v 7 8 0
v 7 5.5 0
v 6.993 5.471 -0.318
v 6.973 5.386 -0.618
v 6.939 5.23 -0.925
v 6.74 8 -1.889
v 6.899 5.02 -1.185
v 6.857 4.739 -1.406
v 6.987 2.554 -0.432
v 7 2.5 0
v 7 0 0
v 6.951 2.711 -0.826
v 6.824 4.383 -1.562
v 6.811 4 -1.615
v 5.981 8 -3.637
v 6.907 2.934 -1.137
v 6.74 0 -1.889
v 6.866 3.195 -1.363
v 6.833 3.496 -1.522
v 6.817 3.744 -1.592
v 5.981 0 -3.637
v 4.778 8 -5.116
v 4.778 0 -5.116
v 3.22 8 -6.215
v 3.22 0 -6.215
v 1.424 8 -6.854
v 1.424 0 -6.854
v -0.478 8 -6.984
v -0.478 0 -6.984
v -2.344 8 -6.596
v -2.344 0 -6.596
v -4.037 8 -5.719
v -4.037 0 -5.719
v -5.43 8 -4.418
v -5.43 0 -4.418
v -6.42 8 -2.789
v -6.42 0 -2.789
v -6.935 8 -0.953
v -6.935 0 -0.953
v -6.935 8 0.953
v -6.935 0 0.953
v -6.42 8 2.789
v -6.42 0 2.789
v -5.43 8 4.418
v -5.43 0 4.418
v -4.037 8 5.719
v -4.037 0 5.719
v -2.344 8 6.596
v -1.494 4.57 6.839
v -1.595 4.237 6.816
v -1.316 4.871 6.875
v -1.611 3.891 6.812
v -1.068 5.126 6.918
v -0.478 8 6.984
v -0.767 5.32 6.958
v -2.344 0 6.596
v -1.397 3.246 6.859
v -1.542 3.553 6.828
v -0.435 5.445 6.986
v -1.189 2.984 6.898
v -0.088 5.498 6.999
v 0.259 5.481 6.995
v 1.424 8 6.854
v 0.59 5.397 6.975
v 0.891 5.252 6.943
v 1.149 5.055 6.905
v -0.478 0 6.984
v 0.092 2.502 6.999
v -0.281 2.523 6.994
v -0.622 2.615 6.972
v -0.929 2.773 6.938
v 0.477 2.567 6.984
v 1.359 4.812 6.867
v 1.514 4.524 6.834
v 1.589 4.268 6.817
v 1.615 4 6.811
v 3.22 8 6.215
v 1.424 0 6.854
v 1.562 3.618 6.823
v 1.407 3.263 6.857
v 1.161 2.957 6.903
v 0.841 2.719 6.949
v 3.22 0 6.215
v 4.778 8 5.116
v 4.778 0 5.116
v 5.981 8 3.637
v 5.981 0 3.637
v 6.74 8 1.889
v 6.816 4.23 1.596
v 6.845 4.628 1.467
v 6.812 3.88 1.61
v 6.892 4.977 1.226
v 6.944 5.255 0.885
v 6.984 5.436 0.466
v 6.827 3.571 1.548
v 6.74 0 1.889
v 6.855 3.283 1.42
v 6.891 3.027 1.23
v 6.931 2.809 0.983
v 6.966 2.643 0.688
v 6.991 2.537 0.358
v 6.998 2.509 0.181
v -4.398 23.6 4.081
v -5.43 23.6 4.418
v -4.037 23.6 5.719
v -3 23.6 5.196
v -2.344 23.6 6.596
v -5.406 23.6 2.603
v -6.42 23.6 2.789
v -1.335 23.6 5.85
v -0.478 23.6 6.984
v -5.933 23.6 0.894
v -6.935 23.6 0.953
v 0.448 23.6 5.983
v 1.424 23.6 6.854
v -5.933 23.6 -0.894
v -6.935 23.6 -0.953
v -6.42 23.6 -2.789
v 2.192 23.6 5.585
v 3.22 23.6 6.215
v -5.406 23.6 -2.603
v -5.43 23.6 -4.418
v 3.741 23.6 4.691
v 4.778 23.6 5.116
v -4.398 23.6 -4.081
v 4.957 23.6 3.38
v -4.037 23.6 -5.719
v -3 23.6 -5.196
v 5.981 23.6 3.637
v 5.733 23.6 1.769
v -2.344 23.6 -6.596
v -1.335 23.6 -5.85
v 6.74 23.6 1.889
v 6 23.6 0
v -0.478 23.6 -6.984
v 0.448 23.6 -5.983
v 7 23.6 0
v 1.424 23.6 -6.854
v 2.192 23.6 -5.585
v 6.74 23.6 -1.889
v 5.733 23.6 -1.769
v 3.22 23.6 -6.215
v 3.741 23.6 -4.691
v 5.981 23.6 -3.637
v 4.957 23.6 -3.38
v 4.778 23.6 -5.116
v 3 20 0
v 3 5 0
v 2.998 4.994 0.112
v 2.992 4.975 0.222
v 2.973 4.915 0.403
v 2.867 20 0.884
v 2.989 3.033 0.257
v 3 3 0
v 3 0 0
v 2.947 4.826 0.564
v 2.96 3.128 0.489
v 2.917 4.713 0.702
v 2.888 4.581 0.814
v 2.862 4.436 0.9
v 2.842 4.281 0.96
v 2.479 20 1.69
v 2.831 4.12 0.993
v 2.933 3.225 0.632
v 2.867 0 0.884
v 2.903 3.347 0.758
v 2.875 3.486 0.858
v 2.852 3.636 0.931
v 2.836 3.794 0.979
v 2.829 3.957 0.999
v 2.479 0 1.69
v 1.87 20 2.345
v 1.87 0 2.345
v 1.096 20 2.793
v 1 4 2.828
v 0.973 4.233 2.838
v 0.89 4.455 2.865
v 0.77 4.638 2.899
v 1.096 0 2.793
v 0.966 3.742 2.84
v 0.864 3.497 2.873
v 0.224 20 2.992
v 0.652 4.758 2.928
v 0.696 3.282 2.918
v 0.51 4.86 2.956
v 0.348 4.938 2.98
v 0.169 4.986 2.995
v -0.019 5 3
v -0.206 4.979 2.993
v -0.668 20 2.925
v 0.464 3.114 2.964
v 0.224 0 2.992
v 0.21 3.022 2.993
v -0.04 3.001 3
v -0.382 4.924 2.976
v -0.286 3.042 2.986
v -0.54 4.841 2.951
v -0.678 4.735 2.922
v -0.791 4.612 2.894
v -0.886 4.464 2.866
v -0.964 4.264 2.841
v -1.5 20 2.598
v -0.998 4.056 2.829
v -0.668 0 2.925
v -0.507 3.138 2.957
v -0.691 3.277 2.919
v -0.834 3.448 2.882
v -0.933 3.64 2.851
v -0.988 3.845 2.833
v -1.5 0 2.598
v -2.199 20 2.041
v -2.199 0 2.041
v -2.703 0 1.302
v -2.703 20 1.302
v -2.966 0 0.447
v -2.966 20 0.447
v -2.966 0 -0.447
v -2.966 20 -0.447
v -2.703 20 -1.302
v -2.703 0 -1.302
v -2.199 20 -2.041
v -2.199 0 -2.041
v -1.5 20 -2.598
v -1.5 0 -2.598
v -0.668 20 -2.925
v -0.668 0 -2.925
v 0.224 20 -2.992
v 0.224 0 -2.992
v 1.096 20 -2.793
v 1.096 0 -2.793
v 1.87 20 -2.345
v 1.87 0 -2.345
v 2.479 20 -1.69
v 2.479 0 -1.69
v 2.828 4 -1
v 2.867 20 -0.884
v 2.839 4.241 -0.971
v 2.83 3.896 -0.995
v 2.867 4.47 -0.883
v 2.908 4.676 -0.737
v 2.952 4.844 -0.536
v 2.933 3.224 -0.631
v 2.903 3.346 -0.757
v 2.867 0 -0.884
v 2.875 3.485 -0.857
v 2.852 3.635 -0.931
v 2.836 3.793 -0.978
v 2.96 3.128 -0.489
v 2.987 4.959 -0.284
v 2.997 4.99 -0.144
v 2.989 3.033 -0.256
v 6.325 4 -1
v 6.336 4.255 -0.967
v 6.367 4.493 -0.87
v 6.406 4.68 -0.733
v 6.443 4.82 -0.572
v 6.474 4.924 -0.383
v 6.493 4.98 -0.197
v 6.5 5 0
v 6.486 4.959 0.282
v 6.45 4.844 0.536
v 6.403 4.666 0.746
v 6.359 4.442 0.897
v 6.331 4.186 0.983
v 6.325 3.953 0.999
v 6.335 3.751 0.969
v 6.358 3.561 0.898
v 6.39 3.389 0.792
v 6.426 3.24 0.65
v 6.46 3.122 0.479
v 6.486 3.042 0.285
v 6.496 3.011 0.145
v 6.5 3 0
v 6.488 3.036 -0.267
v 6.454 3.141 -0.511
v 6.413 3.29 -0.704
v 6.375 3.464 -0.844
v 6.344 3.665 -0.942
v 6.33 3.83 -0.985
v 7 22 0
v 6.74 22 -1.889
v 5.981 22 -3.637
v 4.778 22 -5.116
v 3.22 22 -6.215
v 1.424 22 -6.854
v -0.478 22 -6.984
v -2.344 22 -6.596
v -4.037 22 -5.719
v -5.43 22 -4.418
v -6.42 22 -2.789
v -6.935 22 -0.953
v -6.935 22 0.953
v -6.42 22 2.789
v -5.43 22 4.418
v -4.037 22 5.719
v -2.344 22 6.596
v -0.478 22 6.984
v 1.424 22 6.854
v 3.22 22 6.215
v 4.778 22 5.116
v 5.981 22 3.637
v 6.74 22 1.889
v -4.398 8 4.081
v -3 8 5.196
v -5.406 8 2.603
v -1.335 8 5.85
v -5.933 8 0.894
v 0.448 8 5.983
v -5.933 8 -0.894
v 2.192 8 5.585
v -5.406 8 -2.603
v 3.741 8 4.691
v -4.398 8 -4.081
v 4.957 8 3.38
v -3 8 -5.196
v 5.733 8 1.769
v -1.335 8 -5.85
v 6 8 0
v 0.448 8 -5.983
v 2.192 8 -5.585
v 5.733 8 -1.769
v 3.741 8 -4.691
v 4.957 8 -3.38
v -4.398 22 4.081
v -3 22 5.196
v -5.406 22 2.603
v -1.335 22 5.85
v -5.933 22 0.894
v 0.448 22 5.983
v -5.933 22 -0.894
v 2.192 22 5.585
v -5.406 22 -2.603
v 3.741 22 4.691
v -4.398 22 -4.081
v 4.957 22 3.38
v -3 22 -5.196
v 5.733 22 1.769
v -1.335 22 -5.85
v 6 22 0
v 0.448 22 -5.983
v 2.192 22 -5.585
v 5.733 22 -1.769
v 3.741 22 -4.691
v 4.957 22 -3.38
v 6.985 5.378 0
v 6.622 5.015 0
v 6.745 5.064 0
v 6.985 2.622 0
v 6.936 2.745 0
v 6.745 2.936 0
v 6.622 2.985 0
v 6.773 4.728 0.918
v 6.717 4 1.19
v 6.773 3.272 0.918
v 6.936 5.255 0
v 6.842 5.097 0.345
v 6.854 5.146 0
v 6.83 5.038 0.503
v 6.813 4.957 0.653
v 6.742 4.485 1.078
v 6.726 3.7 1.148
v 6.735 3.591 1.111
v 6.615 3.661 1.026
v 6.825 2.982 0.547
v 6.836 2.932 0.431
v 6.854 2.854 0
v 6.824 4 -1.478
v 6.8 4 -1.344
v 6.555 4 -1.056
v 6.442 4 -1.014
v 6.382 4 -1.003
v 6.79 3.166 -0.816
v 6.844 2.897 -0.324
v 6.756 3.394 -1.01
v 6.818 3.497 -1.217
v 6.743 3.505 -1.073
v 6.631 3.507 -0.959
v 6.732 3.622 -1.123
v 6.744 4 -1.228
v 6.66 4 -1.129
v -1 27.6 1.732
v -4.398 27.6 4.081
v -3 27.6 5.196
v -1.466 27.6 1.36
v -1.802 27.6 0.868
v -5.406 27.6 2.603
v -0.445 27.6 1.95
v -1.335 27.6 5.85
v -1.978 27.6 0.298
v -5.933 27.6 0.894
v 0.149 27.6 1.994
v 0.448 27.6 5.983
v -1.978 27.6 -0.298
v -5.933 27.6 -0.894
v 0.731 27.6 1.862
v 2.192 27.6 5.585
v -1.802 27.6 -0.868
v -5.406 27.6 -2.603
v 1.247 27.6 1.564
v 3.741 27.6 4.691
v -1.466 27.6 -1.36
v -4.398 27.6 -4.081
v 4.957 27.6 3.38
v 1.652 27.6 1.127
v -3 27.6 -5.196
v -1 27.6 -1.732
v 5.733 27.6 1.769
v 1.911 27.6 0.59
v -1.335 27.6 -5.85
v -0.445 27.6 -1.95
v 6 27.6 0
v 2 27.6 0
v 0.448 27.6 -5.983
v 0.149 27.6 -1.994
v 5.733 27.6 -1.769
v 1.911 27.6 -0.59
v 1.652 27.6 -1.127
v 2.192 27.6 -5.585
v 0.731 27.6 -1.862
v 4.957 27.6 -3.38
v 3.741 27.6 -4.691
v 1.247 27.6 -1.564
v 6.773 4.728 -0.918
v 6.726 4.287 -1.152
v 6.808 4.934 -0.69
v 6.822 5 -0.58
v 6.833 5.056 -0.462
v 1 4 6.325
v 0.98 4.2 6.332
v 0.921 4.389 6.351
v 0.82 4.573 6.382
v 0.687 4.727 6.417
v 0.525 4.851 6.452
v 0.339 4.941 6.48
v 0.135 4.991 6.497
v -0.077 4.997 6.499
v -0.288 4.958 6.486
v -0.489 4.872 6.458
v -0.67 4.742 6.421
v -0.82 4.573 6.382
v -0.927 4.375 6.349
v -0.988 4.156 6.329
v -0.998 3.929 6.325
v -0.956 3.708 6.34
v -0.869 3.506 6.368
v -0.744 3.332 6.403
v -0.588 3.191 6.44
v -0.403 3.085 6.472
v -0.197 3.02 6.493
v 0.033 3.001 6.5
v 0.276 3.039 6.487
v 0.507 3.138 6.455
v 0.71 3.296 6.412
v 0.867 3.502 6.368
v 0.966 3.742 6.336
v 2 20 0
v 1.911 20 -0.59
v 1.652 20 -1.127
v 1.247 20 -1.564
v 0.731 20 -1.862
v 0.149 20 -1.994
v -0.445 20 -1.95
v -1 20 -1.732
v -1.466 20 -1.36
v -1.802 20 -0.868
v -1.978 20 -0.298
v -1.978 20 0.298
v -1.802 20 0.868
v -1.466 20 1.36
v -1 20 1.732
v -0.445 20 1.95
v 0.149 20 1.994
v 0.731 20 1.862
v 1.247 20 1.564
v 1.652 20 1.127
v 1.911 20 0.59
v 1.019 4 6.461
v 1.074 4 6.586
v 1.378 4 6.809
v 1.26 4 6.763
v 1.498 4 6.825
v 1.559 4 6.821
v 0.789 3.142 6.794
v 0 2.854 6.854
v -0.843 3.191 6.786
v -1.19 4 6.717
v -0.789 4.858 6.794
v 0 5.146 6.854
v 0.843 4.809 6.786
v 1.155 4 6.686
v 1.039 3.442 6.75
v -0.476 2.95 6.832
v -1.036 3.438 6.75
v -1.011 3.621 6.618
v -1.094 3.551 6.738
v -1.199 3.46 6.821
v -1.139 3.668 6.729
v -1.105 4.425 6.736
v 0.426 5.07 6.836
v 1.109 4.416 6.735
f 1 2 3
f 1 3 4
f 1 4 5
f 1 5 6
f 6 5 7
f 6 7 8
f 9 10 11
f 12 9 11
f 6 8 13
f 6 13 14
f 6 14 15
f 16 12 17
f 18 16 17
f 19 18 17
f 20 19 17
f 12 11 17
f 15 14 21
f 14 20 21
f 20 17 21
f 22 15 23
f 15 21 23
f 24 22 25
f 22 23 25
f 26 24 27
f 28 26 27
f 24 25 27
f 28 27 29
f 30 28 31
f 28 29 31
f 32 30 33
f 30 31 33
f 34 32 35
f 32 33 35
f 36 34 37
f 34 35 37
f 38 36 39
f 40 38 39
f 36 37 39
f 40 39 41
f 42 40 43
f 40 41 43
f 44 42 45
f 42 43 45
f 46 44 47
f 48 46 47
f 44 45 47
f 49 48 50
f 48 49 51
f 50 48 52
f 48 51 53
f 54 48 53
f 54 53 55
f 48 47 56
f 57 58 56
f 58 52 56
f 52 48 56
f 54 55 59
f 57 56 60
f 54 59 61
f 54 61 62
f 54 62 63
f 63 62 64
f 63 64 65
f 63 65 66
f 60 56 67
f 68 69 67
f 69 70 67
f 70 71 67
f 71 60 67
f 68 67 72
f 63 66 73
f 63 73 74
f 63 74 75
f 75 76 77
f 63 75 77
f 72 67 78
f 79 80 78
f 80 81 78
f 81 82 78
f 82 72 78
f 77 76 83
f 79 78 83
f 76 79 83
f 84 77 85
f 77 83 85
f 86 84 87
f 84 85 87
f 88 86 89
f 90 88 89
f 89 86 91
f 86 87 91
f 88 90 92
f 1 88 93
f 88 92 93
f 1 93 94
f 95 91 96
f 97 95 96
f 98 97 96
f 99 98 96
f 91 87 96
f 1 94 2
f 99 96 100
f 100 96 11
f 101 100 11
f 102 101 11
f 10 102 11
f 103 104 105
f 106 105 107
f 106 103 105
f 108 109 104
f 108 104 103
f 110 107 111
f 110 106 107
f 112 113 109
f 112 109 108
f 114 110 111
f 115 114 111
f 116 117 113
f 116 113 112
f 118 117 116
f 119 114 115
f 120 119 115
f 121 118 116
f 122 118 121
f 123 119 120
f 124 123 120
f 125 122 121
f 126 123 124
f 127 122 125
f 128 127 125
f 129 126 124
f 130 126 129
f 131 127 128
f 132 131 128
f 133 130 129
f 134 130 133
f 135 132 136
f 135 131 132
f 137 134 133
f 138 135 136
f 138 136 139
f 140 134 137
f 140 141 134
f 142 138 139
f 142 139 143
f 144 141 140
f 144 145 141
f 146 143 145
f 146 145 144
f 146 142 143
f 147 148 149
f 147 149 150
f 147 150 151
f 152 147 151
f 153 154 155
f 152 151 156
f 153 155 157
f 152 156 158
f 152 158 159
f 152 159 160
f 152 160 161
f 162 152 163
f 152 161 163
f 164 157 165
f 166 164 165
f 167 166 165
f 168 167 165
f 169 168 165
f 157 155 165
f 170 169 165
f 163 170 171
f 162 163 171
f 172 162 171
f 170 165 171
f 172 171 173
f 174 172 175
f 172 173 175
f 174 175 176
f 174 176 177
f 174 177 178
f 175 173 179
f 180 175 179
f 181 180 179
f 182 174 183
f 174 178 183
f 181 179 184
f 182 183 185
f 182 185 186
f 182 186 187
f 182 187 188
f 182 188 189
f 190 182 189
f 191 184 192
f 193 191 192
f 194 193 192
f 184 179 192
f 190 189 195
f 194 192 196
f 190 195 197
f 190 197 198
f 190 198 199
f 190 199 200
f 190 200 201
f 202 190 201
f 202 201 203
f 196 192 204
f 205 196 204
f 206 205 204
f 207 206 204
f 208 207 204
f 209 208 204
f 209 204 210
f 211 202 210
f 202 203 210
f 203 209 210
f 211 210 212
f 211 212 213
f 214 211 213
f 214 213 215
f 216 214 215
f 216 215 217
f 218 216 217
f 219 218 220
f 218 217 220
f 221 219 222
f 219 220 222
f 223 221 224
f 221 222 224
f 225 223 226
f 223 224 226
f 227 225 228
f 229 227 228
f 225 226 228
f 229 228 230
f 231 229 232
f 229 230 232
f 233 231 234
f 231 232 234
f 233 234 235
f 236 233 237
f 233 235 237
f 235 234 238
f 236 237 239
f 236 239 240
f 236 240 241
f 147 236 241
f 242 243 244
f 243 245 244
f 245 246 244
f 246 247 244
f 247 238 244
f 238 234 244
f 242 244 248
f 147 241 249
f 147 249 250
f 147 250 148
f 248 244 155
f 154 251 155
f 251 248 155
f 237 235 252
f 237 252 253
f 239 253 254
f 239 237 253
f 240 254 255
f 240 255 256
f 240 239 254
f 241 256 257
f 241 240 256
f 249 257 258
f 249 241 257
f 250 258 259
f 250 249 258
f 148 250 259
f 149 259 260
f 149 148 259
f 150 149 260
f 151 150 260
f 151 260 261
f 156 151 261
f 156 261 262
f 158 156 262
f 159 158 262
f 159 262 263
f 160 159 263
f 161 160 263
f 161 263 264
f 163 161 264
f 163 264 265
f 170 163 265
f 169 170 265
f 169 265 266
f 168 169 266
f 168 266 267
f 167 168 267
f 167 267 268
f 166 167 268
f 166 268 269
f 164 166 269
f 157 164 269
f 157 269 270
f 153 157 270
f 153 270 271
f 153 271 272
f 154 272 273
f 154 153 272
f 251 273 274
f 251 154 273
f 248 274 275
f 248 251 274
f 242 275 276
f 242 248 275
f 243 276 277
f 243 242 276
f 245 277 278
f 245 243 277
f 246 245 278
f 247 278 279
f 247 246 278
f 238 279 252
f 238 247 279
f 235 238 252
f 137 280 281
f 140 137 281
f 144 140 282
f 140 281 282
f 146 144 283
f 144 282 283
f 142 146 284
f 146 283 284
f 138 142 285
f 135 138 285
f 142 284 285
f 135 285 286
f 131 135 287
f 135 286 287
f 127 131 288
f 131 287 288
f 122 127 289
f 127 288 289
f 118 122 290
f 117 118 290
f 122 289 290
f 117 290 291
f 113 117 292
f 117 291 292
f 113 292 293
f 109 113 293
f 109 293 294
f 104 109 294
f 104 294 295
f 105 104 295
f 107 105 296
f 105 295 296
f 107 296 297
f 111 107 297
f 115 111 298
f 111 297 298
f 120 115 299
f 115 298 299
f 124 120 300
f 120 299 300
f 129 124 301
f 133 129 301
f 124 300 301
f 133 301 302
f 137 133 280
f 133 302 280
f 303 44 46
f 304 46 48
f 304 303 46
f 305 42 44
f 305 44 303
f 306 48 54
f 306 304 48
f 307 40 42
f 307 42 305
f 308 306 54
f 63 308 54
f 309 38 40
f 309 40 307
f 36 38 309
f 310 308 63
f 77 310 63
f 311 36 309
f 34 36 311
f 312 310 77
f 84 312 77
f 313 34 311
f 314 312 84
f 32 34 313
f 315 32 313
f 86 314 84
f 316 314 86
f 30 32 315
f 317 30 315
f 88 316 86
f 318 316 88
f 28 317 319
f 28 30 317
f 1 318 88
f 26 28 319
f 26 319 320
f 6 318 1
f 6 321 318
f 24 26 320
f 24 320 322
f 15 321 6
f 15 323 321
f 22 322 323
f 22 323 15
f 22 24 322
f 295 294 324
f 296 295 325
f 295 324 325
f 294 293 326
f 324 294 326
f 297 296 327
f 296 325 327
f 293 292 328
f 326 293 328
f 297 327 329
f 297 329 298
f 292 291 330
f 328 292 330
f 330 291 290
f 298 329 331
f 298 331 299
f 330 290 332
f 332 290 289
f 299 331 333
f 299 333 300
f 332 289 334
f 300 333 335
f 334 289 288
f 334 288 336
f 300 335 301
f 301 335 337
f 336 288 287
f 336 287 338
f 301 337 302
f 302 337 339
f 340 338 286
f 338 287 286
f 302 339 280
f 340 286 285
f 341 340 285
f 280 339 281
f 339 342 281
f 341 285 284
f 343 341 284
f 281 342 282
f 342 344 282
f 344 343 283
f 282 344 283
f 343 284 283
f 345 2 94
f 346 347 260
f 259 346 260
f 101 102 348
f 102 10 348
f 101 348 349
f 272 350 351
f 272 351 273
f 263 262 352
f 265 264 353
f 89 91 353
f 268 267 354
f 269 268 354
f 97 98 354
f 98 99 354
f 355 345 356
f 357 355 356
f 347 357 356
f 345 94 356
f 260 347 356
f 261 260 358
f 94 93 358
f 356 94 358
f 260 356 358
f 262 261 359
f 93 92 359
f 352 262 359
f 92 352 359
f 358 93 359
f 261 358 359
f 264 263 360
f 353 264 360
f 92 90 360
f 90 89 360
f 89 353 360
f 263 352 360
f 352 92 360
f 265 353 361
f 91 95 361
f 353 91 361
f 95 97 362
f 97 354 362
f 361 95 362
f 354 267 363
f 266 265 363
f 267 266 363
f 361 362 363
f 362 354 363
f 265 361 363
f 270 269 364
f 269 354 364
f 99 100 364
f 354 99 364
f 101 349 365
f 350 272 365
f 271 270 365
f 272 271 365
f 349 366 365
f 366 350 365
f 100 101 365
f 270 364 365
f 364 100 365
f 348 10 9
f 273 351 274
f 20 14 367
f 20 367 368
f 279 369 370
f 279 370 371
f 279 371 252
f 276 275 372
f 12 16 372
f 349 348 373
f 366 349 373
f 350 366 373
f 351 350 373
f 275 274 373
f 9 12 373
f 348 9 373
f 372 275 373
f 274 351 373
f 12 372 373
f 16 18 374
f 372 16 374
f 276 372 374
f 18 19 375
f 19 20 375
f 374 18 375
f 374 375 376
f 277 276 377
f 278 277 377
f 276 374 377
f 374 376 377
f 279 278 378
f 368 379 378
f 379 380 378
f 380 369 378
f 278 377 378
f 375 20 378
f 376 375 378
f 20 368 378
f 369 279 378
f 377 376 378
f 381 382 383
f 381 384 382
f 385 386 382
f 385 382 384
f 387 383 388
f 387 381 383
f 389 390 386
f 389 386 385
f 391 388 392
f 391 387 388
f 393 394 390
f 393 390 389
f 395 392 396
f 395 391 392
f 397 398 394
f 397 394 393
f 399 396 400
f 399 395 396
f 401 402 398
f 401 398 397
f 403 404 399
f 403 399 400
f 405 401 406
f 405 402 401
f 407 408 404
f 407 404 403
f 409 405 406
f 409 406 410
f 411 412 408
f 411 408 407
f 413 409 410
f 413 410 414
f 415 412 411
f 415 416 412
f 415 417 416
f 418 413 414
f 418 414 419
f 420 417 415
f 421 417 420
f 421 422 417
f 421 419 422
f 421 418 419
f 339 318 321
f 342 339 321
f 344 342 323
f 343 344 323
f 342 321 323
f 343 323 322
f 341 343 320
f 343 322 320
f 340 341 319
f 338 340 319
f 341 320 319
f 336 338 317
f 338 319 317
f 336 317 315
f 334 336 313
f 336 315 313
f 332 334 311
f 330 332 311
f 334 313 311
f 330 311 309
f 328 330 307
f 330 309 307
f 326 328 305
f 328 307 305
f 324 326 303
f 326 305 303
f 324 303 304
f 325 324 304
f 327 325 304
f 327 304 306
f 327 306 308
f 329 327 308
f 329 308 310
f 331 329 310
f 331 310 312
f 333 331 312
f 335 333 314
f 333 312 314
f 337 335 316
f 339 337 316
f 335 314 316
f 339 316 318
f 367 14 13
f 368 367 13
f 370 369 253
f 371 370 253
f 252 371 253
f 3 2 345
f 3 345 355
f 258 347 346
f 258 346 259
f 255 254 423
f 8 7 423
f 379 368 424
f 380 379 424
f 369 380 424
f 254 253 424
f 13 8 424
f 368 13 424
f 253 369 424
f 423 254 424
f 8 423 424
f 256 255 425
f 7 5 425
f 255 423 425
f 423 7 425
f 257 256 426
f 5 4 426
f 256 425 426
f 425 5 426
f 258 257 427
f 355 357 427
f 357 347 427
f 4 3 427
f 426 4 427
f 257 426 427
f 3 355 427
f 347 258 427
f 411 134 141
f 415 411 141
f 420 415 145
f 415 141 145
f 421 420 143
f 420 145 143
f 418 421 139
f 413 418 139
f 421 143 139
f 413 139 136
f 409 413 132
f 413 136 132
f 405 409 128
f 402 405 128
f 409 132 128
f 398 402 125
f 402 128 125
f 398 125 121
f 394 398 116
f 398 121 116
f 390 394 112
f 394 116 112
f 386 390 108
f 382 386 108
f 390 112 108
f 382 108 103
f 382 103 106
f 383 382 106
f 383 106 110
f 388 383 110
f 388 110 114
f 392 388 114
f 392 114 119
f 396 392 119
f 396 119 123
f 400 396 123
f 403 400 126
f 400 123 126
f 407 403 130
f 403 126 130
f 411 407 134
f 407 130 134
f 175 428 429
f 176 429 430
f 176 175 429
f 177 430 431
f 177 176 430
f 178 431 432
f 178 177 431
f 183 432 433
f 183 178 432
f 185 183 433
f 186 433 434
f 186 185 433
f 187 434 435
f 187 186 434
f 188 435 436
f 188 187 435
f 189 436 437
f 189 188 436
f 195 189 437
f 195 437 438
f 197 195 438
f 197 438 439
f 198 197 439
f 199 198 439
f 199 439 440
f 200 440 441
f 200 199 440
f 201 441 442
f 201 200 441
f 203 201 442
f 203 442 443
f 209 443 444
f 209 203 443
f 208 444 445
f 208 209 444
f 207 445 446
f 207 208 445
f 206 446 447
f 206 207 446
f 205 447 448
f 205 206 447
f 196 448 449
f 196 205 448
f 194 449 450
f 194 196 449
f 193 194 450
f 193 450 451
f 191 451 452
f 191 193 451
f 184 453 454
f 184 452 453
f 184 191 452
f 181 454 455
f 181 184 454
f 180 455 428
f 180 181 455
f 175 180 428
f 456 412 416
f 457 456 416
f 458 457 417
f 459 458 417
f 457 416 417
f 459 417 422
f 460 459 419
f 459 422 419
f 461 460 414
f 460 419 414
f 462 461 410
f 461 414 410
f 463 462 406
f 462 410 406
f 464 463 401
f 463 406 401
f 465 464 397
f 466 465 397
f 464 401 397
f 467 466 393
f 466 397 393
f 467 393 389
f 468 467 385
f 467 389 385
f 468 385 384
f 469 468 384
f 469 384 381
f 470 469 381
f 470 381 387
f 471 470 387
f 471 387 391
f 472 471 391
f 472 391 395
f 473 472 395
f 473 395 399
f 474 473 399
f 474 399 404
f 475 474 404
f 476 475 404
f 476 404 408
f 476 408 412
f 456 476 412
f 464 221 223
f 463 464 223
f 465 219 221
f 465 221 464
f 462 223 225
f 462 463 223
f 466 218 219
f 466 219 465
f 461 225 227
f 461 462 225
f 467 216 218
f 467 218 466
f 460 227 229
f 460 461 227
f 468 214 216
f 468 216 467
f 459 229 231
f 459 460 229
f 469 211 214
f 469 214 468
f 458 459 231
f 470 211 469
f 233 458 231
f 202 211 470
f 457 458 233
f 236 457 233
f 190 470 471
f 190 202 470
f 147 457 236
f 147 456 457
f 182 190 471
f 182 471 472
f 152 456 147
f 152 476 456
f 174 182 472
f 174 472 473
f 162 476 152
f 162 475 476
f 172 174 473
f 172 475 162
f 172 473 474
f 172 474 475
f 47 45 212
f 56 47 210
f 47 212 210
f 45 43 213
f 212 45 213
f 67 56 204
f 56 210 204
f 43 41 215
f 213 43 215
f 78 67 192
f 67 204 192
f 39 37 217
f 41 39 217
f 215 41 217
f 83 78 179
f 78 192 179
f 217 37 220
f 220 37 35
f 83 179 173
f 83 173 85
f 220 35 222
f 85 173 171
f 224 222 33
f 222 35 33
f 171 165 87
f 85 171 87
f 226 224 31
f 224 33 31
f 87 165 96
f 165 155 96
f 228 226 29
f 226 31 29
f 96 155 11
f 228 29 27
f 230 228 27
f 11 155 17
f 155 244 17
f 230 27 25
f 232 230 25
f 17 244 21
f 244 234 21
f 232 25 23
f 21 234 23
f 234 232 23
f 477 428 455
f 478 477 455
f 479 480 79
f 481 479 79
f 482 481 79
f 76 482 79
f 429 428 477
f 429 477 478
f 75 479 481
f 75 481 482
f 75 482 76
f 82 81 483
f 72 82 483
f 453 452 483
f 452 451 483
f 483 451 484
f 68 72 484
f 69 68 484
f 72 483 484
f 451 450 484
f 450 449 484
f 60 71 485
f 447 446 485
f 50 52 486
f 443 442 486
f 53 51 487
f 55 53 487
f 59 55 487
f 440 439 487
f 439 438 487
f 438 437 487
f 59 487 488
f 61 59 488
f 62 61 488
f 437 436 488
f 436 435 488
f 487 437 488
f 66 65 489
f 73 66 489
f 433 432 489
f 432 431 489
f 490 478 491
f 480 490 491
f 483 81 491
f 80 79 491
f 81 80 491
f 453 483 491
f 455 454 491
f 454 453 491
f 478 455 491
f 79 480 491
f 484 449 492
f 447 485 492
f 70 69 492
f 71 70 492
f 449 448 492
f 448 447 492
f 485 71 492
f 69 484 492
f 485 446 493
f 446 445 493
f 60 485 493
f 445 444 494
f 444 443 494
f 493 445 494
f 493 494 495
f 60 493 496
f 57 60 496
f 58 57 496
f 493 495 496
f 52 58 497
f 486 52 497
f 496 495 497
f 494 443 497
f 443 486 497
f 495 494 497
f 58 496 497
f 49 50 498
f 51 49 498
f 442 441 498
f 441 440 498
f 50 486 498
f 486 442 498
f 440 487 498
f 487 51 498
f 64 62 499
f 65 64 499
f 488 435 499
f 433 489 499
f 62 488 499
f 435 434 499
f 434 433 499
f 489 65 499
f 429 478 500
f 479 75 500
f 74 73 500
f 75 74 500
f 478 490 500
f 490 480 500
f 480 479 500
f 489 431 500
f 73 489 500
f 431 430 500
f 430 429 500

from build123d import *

# Parameters (mm, degrees)
SKETCH1_R           = 7
BOSS_EXTRUDE1_DEPTH = 8
SKETCH2_R           = 6
BOSS_EXTRUDE2_DEPTH = 14
SKETCH3_R           = 7
BOSS_EXTRUDE3_DEPTH = 1.6
SKETCH4_R           = 6
BOSS_EXTRUDE4_DEPTH = 4
SKETCH5_R           = 2
CUT_EXTRUDE1_DEPTH  = 28.6
SKETCH6_R           = 3
CUT_EXTRUDE2_DEPTH  = 20
CUT_EXTRUDE3_START  = -4.171573
SKETCH8_R           = 1
CUT_EXTRUDE3_DEPTH  = 4.171573
CIRPATTERN1_COUNT   = 2
CIRPATTERN1_ANGLE   = 90
FILLET1_R           = 0.5


with BuildPart() as part:
    # Sketch1 → Boss-Extrude1 (new body)
    with BuildSketch(Plane(origin=(0, 0, 0), x_dir=(1, 0, 0), z_dir=(0, 1, 0))):
        Circle(SKETCH1_R)
    extrude(amount=BOSS_EXTRUDE1_DEPTH)

    # Sketch2 → Boss-Extrude2 (add)
    with BuildSketch(Plane(origin=(0, 8, 0), x_dir=(1, 0, 0), z_dir=(0, 1, 0))):
        Circle(SKETCH2_R)
    extrude(amount=BOSS_EXTRUDE2_DEPTH)

    # Sketch3 → Boss-Extrude3 (add)
    with BuildSketch(Plane(origin=(0, 22, 0), x_dir=(1, 0, 0), z_dir=(0, 1, 0))):
        Circle(SKETCH3_R)
    extrude(amount=BOSS_EXTRUDE3_DEPTH)

    # Sketch4 → Boss-Extrude4 (add)
    with BuildSketch(Plane(origin=(0, 23.6, 0), x_dir=(1, 0, 0), z_dir=(0, 1, 0))):
        Circle(SKETCH4_R)
    extrude(amount=BOSS_EXTRUDE4_DEPTH)

    # Sketch5 → Cut-Extrude1 (cut, through all)
    with BuildSketch(Plane(origin=(0, 27.6, 0), x_dir=(1, 0, 0), z_dir=(0, 1, 0))):
        Circle(SKETCH5_R)
    extrude(amount=-CUT_EXTRUDE1_DEPTH, mode=Mode.SUBTRACT)

    # Sketch6 → Cut-Extrude2 (cut)
    with BuildSketch(Plane.XZ):
        Circle(SKETCH6_R)
    extrude(amount=-CUT_EXTRUDE2_DEPTH, mode=Mode.SUBTRACT)

    # Sketch8 → Cut-Extrude3 (cut)
    with BuildSketch(Plane.XY.offset(7).offset(CUT_EXTRUDE3_START)):
        with Locations((0, 4)):
            Circle(SKETCH8_R)
    cut_extrude3 = extrude(amount=CUT_EXTRUDE3_DEPTH, mode=Mode.SUBTRACT)

    # CirPattern1: Cut-Extrude3 ×2 about axis
    cirpattern1_axis = Axis((0, 0, 0), (0, 1, 0))
    for i in range(1, CIRPATTERN1_COUNT):
        add(cut_extrude3.rotate(cirpattern1_axis, i * CIRPATTERN1_ANGLE / (CIRPATTERN1_COUNT - 1)), mode=Mode.SUBTRACT)

    # Fillet1
    fillet1_edges = [part.edges().sort_by_distance(p)[0] for p in [
        (-1, 4, 6.92820323),
        (6.92820323, 4, 1),
    ]]
    fillet(fillet1_edges, radius=FILLET1_R)


solid = part.part
